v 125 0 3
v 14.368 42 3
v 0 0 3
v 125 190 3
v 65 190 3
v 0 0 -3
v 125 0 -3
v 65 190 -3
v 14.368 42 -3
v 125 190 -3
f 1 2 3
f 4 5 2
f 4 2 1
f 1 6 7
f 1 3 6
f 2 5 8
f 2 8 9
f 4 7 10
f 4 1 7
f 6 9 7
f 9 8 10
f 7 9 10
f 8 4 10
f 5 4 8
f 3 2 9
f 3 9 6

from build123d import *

# Parameters (mm, degrees)
BOSS_EXTRUDE1_DEPTH = 3


with BuildPart() as part:
    # Sketch1 → Boss-Extrude1 (new, symmetric)
    with BuildSketch(Plane.XY):
        Polygon((125, 190), (65, 190), (14.368421053, 42), (125, 42), align=None)
        Polygon((125, 42), (14.368421053, 42), (0, 0), (125, 0), align=None)
    extrude(amount=BOSS_EXTRUDE1_DEPTH, both=True)


solid = part.part
